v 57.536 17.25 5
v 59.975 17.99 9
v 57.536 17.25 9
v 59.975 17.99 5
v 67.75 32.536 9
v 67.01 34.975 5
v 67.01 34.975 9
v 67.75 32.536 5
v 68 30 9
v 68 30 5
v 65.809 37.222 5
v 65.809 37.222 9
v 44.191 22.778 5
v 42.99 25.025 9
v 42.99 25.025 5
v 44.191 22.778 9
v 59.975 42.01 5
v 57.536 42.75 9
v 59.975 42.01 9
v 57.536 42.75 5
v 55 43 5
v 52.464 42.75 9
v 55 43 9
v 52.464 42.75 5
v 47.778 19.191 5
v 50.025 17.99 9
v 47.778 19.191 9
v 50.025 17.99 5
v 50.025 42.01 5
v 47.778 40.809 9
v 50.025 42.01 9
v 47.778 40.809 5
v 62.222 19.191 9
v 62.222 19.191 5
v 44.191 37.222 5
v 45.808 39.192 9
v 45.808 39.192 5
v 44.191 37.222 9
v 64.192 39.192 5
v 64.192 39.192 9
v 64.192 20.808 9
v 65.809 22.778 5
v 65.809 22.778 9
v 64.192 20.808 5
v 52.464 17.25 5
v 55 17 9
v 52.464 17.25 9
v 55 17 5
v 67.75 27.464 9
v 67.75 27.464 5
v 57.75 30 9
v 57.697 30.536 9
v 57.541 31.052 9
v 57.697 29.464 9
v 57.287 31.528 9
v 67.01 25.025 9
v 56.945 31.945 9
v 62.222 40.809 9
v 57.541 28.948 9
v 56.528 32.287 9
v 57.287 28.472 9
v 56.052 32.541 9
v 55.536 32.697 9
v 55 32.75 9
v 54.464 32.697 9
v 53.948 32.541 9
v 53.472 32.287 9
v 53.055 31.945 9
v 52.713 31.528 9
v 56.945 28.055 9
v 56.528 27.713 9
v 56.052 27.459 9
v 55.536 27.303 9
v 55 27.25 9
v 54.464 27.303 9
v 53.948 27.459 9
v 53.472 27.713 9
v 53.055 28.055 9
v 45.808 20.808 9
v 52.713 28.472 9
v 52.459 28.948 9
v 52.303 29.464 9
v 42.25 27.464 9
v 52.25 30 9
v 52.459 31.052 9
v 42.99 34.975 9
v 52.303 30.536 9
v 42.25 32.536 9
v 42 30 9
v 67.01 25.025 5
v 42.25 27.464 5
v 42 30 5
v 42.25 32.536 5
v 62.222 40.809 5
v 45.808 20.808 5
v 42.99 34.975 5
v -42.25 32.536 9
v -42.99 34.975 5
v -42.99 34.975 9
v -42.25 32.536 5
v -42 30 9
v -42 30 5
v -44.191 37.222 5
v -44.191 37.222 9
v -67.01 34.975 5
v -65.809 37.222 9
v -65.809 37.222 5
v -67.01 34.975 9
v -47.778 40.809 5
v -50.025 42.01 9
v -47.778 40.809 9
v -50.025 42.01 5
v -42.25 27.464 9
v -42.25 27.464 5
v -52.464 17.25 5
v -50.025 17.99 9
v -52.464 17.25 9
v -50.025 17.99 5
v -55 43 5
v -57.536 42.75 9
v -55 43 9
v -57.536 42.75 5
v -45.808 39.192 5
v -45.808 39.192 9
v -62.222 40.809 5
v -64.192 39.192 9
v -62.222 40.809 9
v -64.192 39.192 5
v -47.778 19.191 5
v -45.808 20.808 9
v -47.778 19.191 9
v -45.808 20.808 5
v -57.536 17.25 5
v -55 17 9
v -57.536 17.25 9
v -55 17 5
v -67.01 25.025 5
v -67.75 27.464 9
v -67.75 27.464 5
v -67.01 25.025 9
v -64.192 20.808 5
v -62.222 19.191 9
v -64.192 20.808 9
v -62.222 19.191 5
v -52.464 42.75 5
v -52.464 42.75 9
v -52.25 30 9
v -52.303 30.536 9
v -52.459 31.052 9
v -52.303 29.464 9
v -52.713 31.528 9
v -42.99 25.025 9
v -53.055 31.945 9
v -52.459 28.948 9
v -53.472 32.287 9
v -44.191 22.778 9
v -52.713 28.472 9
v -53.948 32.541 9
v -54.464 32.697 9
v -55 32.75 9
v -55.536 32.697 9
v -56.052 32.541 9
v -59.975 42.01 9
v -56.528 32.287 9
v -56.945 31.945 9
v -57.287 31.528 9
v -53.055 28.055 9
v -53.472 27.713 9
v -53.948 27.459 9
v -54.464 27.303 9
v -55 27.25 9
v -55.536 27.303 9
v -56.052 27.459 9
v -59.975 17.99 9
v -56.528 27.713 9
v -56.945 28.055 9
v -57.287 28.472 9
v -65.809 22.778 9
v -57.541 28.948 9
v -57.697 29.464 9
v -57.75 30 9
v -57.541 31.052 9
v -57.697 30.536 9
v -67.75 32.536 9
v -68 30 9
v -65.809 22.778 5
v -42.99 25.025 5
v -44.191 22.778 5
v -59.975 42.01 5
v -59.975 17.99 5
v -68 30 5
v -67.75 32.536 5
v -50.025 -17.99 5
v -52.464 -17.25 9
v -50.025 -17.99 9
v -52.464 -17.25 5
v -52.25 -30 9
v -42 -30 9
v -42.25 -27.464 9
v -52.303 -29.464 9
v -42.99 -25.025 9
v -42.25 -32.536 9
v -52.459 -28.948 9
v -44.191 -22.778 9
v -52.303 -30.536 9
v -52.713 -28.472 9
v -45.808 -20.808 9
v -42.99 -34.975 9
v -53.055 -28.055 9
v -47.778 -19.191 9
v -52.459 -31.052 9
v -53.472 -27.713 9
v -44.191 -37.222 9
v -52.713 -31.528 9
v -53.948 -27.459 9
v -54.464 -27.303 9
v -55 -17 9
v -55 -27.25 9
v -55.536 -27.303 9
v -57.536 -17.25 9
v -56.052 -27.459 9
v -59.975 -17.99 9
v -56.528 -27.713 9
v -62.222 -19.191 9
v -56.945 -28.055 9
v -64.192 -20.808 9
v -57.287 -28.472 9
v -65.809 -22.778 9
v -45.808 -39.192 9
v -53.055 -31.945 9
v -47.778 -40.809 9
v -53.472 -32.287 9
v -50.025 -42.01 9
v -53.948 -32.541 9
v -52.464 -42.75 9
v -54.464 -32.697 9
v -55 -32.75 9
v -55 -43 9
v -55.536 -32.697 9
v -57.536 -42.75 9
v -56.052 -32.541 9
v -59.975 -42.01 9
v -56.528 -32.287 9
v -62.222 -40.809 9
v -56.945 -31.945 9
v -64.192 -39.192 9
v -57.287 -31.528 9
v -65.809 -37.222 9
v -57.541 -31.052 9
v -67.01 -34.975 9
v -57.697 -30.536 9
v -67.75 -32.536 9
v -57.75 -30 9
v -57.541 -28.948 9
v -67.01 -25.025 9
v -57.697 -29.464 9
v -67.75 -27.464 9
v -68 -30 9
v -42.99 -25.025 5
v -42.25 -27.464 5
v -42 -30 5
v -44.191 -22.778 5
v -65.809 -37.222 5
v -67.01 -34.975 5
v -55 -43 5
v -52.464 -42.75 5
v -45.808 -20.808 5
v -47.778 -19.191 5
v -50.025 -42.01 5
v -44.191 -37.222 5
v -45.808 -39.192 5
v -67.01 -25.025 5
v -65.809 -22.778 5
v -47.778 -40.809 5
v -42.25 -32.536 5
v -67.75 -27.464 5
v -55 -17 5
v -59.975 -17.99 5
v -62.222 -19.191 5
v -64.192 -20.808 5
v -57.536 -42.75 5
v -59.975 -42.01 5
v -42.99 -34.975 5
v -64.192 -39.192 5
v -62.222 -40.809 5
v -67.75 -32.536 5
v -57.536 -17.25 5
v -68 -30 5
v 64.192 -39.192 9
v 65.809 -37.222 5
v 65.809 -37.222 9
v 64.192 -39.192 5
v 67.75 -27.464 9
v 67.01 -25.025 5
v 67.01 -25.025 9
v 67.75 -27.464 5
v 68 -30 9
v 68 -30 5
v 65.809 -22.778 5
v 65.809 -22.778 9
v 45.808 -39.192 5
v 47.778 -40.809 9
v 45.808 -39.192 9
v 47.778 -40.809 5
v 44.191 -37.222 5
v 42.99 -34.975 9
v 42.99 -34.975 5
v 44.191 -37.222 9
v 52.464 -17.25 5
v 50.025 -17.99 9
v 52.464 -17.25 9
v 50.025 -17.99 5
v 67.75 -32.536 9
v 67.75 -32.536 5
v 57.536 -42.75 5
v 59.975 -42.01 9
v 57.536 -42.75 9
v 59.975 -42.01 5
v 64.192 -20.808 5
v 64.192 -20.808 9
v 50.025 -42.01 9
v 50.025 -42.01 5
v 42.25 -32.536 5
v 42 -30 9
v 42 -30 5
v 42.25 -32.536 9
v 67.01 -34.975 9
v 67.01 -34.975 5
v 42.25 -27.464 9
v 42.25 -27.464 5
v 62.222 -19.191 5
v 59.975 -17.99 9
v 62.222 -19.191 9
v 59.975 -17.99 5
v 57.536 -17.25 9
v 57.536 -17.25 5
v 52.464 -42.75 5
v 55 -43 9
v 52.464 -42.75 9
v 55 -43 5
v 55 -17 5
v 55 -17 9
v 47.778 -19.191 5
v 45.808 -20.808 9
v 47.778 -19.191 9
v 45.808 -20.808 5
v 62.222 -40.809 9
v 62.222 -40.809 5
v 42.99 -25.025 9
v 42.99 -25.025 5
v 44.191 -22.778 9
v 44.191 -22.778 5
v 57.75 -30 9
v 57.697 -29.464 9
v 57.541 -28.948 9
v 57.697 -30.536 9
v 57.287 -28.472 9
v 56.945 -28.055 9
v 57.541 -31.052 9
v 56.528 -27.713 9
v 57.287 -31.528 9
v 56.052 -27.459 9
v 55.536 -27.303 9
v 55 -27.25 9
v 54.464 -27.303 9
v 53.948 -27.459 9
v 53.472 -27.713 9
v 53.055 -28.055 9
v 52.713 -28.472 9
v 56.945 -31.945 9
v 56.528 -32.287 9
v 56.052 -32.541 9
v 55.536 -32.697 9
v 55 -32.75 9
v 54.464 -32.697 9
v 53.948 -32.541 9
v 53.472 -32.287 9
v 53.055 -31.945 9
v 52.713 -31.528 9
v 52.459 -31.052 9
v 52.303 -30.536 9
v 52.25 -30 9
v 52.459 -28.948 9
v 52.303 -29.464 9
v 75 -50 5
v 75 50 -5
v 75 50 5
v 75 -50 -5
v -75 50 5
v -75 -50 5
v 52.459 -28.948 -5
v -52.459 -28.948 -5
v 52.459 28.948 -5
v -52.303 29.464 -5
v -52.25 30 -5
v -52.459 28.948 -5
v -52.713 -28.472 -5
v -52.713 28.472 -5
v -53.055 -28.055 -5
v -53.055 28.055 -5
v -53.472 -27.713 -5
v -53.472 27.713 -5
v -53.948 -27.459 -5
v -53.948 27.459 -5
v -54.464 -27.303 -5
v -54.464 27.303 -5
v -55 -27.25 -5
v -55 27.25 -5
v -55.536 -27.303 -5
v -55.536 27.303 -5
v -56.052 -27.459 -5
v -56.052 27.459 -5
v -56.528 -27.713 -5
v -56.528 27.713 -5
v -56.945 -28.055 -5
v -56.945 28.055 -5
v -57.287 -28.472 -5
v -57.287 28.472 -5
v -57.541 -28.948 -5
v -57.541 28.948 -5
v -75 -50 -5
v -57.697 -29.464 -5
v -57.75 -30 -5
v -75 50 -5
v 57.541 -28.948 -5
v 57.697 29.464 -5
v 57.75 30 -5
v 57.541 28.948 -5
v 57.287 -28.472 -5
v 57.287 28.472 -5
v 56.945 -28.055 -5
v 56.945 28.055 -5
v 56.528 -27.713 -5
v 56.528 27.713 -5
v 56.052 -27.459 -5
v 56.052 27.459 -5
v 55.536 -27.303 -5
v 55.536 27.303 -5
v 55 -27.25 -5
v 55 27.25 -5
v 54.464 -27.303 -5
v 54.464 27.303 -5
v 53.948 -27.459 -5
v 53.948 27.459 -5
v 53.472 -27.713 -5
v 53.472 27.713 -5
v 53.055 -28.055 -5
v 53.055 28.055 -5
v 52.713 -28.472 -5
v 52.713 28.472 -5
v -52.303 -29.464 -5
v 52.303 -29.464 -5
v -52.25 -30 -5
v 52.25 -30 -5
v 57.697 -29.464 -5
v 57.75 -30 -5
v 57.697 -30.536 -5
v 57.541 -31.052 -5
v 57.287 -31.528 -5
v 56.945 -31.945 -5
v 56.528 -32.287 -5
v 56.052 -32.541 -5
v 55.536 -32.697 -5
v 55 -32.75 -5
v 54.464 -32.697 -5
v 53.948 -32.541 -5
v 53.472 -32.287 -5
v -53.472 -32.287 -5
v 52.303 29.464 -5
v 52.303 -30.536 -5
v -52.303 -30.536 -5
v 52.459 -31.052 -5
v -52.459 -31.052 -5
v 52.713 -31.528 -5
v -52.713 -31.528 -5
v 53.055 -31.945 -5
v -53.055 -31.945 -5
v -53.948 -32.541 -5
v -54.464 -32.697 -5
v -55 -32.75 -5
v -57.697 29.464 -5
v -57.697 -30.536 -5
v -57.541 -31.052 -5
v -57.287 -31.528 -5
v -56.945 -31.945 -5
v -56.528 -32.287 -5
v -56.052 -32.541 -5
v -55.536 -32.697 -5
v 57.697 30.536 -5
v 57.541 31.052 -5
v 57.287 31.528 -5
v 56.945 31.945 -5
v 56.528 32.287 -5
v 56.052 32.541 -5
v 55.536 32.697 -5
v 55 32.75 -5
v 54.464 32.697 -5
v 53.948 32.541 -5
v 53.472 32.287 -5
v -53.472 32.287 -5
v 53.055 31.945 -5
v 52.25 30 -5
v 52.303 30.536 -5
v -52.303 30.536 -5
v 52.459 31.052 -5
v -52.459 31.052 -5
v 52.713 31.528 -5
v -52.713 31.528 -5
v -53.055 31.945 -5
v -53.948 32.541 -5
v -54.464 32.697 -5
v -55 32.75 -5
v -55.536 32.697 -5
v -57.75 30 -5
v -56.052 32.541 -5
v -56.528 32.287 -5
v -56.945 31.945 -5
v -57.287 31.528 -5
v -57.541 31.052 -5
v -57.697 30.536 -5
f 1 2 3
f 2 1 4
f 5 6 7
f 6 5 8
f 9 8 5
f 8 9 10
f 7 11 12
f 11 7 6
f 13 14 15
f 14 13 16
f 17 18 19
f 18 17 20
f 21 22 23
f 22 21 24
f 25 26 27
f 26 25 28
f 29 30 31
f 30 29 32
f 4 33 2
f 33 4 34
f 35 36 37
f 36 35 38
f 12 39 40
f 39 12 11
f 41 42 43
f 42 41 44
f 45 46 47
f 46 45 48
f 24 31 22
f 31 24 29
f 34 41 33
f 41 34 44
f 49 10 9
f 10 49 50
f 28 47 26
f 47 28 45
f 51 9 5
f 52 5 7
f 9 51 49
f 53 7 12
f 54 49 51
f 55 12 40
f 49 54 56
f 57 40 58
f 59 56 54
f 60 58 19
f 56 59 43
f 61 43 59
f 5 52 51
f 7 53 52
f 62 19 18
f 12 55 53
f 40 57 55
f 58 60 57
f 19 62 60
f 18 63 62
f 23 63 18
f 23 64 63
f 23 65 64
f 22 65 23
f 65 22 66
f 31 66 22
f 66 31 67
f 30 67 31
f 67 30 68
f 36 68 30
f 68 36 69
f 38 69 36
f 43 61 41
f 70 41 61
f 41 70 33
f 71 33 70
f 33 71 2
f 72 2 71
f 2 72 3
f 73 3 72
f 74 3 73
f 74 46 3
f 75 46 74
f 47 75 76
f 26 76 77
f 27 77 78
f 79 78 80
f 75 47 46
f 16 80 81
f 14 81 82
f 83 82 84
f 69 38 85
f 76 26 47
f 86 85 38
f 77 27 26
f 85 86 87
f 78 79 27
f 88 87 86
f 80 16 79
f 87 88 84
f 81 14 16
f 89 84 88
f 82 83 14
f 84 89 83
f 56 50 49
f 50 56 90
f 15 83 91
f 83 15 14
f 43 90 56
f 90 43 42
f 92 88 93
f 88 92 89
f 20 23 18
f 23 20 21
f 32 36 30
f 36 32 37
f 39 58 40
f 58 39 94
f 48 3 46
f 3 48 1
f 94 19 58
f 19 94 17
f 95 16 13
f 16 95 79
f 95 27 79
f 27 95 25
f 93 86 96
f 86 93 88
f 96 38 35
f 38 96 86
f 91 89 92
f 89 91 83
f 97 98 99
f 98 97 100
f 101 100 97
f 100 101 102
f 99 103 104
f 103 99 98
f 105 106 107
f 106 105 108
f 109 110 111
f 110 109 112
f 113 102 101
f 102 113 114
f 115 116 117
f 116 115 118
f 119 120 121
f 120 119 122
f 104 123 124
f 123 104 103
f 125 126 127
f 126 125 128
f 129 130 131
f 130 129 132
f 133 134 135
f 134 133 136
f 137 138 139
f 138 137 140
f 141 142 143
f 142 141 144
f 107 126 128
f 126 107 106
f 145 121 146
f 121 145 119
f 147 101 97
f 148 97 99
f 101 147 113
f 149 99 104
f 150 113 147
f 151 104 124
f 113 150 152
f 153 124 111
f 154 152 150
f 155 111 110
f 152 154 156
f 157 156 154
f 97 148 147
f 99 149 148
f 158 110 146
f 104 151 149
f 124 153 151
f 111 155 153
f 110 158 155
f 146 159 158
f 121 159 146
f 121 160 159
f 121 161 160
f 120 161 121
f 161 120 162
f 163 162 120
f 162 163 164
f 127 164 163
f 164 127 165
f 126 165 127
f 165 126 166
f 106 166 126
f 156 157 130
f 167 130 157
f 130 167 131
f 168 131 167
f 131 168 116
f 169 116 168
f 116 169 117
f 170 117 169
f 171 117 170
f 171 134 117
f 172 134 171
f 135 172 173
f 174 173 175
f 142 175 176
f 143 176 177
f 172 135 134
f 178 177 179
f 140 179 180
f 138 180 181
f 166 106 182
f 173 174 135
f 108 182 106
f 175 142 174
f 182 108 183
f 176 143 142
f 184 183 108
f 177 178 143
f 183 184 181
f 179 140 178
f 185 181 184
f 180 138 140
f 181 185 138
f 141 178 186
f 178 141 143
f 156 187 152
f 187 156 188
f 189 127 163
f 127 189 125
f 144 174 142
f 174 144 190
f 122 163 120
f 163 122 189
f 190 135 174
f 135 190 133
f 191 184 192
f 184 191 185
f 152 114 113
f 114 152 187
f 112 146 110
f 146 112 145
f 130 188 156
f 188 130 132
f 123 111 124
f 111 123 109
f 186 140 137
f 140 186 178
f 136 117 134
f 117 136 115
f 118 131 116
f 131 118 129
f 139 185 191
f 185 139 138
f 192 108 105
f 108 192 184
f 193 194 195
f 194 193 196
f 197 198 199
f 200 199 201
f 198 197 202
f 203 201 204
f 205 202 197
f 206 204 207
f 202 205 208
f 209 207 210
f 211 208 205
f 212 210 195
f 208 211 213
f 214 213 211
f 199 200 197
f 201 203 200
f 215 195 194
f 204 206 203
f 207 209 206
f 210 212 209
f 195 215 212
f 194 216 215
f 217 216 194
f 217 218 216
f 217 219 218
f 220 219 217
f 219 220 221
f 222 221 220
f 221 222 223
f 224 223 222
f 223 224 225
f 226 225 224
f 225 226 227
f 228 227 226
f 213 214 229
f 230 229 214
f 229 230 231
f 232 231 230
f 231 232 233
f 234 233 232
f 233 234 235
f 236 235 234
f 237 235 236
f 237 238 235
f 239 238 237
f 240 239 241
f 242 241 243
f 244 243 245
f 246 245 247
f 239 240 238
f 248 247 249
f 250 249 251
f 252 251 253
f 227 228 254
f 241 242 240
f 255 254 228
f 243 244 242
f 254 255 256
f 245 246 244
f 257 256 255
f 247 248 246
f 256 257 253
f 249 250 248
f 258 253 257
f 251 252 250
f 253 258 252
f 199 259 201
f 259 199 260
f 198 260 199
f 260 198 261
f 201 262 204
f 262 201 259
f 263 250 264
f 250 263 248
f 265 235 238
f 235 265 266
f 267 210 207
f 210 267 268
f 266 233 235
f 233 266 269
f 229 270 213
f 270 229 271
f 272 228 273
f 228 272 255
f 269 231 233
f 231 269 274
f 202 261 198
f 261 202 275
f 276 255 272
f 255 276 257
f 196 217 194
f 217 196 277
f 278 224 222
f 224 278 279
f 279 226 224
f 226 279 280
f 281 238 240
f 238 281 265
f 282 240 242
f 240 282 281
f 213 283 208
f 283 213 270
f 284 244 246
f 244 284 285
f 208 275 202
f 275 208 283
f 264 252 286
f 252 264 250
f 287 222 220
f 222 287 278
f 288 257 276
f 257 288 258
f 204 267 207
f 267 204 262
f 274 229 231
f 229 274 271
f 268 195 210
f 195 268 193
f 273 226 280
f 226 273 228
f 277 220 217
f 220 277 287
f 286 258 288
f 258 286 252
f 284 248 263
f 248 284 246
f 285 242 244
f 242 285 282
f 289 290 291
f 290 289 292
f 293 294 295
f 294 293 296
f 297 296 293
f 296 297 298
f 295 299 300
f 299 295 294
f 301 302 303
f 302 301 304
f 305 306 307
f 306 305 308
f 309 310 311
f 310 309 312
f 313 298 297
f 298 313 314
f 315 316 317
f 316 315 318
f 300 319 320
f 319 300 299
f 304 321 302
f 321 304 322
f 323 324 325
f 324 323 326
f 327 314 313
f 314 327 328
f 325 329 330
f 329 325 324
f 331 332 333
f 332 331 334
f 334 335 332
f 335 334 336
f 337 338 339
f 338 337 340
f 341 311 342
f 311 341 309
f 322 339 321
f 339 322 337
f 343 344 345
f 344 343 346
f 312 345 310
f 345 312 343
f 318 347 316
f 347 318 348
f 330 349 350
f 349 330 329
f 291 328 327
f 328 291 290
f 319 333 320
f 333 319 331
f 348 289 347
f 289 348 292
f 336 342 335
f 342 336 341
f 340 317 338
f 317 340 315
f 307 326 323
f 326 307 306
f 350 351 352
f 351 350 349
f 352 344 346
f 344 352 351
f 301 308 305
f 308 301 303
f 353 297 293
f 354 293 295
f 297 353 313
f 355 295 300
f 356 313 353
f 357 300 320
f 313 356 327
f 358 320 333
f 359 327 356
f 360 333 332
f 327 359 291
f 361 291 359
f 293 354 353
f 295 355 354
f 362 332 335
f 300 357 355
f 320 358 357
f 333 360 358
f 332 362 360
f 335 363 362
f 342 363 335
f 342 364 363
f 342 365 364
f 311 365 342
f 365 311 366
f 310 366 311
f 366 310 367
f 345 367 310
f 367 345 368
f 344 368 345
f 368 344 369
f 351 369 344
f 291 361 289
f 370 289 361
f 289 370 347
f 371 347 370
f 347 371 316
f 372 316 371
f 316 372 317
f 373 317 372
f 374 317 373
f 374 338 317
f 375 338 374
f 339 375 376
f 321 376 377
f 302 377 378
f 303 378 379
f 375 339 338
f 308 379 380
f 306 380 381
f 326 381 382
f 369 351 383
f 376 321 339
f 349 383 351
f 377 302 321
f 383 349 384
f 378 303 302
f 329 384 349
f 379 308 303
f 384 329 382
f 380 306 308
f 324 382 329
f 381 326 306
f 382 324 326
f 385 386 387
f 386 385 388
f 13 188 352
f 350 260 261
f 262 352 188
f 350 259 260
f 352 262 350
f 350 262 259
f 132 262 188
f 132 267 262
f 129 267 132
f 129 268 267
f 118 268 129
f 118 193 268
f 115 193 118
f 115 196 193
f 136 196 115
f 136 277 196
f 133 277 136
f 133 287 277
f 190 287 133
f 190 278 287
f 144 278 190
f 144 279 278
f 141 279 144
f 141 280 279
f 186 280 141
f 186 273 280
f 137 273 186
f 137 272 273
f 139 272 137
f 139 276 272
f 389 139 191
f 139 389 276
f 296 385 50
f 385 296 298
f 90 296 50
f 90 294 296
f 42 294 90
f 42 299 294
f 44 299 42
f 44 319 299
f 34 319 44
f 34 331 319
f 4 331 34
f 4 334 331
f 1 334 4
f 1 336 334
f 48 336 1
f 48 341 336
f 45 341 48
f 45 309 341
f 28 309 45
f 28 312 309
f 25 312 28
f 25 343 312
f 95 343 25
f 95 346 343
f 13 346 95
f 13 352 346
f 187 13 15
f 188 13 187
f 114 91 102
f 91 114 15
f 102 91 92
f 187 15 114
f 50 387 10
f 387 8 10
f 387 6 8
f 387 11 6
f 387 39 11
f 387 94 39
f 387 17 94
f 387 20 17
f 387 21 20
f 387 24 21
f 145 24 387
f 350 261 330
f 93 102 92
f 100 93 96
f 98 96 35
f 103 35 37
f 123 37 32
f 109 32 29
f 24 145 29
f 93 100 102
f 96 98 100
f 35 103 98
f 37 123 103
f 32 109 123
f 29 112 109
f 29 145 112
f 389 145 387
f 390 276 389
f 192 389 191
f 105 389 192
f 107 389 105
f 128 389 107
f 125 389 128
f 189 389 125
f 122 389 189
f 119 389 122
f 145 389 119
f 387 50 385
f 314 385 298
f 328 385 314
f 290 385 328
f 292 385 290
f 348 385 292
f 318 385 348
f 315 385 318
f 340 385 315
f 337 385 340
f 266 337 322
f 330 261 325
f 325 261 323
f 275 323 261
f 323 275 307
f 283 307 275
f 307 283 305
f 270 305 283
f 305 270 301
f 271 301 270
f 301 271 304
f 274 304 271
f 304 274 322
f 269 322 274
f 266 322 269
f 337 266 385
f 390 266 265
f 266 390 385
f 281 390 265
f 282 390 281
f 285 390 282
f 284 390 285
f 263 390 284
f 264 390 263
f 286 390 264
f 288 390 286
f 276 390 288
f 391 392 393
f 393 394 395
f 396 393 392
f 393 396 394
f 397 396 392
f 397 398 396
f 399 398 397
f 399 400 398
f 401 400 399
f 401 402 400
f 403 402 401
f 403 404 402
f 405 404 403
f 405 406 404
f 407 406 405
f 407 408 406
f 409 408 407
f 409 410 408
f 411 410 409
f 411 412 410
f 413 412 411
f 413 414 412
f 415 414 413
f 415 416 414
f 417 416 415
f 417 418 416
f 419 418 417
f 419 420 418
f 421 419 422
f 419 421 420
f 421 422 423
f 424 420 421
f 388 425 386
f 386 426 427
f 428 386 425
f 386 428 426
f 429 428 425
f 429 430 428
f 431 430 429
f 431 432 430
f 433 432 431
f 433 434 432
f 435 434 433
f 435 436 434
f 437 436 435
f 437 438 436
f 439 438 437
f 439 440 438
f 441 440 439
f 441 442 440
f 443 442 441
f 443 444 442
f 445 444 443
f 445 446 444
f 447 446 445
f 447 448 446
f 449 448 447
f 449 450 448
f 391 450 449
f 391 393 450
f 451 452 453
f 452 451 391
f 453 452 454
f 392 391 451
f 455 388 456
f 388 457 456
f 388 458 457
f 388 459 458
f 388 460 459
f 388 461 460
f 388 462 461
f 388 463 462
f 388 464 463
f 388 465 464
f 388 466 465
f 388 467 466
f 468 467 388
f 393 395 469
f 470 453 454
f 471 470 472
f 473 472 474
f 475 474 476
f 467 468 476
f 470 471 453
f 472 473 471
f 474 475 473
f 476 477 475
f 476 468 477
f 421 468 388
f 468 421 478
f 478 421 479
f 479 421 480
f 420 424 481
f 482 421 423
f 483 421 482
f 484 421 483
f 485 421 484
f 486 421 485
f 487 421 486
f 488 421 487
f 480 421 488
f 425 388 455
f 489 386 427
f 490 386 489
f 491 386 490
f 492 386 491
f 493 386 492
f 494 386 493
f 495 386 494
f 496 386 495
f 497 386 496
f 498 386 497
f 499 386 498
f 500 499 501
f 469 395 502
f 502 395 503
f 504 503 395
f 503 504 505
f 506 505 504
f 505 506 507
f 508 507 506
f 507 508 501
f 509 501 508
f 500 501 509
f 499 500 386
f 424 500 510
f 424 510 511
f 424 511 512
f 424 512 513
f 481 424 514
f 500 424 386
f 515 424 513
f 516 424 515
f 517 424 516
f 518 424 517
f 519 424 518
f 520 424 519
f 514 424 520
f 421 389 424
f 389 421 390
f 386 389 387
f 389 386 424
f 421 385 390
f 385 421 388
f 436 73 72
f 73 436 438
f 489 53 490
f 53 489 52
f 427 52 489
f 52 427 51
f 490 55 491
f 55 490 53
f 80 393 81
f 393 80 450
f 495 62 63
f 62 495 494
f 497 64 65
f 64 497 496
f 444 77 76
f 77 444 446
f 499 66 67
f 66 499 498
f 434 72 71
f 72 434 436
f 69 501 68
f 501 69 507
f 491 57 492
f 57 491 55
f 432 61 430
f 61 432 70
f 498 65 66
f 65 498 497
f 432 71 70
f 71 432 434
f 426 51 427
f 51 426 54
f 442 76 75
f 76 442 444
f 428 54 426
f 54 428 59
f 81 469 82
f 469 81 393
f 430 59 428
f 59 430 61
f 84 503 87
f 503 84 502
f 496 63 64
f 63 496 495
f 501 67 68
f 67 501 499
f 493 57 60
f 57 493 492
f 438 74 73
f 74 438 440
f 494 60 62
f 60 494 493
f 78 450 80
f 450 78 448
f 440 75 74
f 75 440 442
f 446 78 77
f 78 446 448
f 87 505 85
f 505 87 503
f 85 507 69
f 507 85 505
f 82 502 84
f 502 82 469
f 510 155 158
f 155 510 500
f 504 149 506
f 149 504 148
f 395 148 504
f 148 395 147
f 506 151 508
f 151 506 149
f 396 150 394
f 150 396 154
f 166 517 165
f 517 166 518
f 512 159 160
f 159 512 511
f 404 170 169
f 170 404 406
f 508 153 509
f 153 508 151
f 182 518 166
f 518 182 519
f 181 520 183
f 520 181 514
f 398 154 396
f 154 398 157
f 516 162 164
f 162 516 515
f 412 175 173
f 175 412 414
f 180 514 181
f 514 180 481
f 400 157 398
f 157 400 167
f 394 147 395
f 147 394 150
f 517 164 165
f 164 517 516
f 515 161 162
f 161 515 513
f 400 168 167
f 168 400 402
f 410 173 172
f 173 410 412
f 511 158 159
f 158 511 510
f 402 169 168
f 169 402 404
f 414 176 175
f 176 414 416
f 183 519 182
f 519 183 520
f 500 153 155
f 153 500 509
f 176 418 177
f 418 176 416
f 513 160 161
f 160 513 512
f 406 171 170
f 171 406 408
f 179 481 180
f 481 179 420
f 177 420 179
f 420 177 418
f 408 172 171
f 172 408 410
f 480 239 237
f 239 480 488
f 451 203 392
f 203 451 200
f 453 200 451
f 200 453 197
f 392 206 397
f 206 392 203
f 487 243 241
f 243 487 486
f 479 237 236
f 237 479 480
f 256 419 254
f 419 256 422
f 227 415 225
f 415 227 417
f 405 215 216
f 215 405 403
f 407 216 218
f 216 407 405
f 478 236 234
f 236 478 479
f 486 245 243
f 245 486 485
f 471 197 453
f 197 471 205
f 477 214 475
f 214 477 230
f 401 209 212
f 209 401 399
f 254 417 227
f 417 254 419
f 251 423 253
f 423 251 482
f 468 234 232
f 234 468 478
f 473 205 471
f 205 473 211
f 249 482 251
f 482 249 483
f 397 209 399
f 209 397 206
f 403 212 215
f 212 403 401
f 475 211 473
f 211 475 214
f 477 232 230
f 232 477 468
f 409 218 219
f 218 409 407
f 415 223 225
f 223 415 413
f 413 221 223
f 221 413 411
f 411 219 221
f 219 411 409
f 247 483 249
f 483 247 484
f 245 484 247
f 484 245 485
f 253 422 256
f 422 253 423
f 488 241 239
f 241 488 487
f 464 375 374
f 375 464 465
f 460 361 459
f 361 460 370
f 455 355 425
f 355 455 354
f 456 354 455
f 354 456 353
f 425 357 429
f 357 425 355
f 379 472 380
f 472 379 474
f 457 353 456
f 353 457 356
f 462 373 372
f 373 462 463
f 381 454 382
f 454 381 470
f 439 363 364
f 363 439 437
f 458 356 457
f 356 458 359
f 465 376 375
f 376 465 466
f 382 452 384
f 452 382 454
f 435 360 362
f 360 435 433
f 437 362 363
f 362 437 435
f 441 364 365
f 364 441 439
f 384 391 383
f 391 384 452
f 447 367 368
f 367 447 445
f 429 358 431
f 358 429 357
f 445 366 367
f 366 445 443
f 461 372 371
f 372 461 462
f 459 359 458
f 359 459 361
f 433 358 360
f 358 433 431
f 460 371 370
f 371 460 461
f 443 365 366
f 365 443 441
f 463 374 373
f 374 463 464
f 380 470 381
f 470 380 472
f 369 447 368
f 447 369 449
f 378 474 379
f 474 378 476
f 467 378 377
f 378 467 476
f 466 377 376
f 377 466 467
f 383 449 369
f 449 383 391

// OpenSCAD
$fn = 32;

// ----------------------------------------------------------------------
// Anchor pads 150 x 100 x 14
// four corner bosses with anchor holes
// ----------------------------------------------------------------------

// --- parameters (mm) ---
plate = [150, 100, 10];  // base plate size (x, y, z)
pads = 4;                // boss count, one per corner
edge = 20;               // boss centre offset from the plate edge
boss_d = 26;             // boss diameter
boss_h = 4;              // boss height above the base plate
hole_d = 5.5;            // hole diameter

// --- derived feature positions (mm) ---
height = plate[2] + boss_h;      // = 14   overall height of the part
corner_x = plate[0] / 2 - edge;  // = 55   boss centre X
corner_y = plate[1] / 2 - edge;  // = 30   boss centre Y
feature_centers = [
  [corner_x, corner_y],
  [-corner_x, corner_y],
  [-corner_x, -corner_y],
  [corner_x, -corner_y]
];   // boss centres, anchor holes are drilled there

// base plate, four bosses standing on it, anchor holes all the way through
difference() {
  union() {
    cube(plate, center = true);
    for (centre = feature_centers)
      translate([centre[0], centre[1], plate[2] / 2 - 1])
        cylinder(d = boss_d, h = boss_h + 1);
  }
  for (centre = feature_centers)
    translate([centre[0], centre[1], -height])
      cylinder(d = hole_d, h = 2 * height + 2);  // through boss and plate
}
